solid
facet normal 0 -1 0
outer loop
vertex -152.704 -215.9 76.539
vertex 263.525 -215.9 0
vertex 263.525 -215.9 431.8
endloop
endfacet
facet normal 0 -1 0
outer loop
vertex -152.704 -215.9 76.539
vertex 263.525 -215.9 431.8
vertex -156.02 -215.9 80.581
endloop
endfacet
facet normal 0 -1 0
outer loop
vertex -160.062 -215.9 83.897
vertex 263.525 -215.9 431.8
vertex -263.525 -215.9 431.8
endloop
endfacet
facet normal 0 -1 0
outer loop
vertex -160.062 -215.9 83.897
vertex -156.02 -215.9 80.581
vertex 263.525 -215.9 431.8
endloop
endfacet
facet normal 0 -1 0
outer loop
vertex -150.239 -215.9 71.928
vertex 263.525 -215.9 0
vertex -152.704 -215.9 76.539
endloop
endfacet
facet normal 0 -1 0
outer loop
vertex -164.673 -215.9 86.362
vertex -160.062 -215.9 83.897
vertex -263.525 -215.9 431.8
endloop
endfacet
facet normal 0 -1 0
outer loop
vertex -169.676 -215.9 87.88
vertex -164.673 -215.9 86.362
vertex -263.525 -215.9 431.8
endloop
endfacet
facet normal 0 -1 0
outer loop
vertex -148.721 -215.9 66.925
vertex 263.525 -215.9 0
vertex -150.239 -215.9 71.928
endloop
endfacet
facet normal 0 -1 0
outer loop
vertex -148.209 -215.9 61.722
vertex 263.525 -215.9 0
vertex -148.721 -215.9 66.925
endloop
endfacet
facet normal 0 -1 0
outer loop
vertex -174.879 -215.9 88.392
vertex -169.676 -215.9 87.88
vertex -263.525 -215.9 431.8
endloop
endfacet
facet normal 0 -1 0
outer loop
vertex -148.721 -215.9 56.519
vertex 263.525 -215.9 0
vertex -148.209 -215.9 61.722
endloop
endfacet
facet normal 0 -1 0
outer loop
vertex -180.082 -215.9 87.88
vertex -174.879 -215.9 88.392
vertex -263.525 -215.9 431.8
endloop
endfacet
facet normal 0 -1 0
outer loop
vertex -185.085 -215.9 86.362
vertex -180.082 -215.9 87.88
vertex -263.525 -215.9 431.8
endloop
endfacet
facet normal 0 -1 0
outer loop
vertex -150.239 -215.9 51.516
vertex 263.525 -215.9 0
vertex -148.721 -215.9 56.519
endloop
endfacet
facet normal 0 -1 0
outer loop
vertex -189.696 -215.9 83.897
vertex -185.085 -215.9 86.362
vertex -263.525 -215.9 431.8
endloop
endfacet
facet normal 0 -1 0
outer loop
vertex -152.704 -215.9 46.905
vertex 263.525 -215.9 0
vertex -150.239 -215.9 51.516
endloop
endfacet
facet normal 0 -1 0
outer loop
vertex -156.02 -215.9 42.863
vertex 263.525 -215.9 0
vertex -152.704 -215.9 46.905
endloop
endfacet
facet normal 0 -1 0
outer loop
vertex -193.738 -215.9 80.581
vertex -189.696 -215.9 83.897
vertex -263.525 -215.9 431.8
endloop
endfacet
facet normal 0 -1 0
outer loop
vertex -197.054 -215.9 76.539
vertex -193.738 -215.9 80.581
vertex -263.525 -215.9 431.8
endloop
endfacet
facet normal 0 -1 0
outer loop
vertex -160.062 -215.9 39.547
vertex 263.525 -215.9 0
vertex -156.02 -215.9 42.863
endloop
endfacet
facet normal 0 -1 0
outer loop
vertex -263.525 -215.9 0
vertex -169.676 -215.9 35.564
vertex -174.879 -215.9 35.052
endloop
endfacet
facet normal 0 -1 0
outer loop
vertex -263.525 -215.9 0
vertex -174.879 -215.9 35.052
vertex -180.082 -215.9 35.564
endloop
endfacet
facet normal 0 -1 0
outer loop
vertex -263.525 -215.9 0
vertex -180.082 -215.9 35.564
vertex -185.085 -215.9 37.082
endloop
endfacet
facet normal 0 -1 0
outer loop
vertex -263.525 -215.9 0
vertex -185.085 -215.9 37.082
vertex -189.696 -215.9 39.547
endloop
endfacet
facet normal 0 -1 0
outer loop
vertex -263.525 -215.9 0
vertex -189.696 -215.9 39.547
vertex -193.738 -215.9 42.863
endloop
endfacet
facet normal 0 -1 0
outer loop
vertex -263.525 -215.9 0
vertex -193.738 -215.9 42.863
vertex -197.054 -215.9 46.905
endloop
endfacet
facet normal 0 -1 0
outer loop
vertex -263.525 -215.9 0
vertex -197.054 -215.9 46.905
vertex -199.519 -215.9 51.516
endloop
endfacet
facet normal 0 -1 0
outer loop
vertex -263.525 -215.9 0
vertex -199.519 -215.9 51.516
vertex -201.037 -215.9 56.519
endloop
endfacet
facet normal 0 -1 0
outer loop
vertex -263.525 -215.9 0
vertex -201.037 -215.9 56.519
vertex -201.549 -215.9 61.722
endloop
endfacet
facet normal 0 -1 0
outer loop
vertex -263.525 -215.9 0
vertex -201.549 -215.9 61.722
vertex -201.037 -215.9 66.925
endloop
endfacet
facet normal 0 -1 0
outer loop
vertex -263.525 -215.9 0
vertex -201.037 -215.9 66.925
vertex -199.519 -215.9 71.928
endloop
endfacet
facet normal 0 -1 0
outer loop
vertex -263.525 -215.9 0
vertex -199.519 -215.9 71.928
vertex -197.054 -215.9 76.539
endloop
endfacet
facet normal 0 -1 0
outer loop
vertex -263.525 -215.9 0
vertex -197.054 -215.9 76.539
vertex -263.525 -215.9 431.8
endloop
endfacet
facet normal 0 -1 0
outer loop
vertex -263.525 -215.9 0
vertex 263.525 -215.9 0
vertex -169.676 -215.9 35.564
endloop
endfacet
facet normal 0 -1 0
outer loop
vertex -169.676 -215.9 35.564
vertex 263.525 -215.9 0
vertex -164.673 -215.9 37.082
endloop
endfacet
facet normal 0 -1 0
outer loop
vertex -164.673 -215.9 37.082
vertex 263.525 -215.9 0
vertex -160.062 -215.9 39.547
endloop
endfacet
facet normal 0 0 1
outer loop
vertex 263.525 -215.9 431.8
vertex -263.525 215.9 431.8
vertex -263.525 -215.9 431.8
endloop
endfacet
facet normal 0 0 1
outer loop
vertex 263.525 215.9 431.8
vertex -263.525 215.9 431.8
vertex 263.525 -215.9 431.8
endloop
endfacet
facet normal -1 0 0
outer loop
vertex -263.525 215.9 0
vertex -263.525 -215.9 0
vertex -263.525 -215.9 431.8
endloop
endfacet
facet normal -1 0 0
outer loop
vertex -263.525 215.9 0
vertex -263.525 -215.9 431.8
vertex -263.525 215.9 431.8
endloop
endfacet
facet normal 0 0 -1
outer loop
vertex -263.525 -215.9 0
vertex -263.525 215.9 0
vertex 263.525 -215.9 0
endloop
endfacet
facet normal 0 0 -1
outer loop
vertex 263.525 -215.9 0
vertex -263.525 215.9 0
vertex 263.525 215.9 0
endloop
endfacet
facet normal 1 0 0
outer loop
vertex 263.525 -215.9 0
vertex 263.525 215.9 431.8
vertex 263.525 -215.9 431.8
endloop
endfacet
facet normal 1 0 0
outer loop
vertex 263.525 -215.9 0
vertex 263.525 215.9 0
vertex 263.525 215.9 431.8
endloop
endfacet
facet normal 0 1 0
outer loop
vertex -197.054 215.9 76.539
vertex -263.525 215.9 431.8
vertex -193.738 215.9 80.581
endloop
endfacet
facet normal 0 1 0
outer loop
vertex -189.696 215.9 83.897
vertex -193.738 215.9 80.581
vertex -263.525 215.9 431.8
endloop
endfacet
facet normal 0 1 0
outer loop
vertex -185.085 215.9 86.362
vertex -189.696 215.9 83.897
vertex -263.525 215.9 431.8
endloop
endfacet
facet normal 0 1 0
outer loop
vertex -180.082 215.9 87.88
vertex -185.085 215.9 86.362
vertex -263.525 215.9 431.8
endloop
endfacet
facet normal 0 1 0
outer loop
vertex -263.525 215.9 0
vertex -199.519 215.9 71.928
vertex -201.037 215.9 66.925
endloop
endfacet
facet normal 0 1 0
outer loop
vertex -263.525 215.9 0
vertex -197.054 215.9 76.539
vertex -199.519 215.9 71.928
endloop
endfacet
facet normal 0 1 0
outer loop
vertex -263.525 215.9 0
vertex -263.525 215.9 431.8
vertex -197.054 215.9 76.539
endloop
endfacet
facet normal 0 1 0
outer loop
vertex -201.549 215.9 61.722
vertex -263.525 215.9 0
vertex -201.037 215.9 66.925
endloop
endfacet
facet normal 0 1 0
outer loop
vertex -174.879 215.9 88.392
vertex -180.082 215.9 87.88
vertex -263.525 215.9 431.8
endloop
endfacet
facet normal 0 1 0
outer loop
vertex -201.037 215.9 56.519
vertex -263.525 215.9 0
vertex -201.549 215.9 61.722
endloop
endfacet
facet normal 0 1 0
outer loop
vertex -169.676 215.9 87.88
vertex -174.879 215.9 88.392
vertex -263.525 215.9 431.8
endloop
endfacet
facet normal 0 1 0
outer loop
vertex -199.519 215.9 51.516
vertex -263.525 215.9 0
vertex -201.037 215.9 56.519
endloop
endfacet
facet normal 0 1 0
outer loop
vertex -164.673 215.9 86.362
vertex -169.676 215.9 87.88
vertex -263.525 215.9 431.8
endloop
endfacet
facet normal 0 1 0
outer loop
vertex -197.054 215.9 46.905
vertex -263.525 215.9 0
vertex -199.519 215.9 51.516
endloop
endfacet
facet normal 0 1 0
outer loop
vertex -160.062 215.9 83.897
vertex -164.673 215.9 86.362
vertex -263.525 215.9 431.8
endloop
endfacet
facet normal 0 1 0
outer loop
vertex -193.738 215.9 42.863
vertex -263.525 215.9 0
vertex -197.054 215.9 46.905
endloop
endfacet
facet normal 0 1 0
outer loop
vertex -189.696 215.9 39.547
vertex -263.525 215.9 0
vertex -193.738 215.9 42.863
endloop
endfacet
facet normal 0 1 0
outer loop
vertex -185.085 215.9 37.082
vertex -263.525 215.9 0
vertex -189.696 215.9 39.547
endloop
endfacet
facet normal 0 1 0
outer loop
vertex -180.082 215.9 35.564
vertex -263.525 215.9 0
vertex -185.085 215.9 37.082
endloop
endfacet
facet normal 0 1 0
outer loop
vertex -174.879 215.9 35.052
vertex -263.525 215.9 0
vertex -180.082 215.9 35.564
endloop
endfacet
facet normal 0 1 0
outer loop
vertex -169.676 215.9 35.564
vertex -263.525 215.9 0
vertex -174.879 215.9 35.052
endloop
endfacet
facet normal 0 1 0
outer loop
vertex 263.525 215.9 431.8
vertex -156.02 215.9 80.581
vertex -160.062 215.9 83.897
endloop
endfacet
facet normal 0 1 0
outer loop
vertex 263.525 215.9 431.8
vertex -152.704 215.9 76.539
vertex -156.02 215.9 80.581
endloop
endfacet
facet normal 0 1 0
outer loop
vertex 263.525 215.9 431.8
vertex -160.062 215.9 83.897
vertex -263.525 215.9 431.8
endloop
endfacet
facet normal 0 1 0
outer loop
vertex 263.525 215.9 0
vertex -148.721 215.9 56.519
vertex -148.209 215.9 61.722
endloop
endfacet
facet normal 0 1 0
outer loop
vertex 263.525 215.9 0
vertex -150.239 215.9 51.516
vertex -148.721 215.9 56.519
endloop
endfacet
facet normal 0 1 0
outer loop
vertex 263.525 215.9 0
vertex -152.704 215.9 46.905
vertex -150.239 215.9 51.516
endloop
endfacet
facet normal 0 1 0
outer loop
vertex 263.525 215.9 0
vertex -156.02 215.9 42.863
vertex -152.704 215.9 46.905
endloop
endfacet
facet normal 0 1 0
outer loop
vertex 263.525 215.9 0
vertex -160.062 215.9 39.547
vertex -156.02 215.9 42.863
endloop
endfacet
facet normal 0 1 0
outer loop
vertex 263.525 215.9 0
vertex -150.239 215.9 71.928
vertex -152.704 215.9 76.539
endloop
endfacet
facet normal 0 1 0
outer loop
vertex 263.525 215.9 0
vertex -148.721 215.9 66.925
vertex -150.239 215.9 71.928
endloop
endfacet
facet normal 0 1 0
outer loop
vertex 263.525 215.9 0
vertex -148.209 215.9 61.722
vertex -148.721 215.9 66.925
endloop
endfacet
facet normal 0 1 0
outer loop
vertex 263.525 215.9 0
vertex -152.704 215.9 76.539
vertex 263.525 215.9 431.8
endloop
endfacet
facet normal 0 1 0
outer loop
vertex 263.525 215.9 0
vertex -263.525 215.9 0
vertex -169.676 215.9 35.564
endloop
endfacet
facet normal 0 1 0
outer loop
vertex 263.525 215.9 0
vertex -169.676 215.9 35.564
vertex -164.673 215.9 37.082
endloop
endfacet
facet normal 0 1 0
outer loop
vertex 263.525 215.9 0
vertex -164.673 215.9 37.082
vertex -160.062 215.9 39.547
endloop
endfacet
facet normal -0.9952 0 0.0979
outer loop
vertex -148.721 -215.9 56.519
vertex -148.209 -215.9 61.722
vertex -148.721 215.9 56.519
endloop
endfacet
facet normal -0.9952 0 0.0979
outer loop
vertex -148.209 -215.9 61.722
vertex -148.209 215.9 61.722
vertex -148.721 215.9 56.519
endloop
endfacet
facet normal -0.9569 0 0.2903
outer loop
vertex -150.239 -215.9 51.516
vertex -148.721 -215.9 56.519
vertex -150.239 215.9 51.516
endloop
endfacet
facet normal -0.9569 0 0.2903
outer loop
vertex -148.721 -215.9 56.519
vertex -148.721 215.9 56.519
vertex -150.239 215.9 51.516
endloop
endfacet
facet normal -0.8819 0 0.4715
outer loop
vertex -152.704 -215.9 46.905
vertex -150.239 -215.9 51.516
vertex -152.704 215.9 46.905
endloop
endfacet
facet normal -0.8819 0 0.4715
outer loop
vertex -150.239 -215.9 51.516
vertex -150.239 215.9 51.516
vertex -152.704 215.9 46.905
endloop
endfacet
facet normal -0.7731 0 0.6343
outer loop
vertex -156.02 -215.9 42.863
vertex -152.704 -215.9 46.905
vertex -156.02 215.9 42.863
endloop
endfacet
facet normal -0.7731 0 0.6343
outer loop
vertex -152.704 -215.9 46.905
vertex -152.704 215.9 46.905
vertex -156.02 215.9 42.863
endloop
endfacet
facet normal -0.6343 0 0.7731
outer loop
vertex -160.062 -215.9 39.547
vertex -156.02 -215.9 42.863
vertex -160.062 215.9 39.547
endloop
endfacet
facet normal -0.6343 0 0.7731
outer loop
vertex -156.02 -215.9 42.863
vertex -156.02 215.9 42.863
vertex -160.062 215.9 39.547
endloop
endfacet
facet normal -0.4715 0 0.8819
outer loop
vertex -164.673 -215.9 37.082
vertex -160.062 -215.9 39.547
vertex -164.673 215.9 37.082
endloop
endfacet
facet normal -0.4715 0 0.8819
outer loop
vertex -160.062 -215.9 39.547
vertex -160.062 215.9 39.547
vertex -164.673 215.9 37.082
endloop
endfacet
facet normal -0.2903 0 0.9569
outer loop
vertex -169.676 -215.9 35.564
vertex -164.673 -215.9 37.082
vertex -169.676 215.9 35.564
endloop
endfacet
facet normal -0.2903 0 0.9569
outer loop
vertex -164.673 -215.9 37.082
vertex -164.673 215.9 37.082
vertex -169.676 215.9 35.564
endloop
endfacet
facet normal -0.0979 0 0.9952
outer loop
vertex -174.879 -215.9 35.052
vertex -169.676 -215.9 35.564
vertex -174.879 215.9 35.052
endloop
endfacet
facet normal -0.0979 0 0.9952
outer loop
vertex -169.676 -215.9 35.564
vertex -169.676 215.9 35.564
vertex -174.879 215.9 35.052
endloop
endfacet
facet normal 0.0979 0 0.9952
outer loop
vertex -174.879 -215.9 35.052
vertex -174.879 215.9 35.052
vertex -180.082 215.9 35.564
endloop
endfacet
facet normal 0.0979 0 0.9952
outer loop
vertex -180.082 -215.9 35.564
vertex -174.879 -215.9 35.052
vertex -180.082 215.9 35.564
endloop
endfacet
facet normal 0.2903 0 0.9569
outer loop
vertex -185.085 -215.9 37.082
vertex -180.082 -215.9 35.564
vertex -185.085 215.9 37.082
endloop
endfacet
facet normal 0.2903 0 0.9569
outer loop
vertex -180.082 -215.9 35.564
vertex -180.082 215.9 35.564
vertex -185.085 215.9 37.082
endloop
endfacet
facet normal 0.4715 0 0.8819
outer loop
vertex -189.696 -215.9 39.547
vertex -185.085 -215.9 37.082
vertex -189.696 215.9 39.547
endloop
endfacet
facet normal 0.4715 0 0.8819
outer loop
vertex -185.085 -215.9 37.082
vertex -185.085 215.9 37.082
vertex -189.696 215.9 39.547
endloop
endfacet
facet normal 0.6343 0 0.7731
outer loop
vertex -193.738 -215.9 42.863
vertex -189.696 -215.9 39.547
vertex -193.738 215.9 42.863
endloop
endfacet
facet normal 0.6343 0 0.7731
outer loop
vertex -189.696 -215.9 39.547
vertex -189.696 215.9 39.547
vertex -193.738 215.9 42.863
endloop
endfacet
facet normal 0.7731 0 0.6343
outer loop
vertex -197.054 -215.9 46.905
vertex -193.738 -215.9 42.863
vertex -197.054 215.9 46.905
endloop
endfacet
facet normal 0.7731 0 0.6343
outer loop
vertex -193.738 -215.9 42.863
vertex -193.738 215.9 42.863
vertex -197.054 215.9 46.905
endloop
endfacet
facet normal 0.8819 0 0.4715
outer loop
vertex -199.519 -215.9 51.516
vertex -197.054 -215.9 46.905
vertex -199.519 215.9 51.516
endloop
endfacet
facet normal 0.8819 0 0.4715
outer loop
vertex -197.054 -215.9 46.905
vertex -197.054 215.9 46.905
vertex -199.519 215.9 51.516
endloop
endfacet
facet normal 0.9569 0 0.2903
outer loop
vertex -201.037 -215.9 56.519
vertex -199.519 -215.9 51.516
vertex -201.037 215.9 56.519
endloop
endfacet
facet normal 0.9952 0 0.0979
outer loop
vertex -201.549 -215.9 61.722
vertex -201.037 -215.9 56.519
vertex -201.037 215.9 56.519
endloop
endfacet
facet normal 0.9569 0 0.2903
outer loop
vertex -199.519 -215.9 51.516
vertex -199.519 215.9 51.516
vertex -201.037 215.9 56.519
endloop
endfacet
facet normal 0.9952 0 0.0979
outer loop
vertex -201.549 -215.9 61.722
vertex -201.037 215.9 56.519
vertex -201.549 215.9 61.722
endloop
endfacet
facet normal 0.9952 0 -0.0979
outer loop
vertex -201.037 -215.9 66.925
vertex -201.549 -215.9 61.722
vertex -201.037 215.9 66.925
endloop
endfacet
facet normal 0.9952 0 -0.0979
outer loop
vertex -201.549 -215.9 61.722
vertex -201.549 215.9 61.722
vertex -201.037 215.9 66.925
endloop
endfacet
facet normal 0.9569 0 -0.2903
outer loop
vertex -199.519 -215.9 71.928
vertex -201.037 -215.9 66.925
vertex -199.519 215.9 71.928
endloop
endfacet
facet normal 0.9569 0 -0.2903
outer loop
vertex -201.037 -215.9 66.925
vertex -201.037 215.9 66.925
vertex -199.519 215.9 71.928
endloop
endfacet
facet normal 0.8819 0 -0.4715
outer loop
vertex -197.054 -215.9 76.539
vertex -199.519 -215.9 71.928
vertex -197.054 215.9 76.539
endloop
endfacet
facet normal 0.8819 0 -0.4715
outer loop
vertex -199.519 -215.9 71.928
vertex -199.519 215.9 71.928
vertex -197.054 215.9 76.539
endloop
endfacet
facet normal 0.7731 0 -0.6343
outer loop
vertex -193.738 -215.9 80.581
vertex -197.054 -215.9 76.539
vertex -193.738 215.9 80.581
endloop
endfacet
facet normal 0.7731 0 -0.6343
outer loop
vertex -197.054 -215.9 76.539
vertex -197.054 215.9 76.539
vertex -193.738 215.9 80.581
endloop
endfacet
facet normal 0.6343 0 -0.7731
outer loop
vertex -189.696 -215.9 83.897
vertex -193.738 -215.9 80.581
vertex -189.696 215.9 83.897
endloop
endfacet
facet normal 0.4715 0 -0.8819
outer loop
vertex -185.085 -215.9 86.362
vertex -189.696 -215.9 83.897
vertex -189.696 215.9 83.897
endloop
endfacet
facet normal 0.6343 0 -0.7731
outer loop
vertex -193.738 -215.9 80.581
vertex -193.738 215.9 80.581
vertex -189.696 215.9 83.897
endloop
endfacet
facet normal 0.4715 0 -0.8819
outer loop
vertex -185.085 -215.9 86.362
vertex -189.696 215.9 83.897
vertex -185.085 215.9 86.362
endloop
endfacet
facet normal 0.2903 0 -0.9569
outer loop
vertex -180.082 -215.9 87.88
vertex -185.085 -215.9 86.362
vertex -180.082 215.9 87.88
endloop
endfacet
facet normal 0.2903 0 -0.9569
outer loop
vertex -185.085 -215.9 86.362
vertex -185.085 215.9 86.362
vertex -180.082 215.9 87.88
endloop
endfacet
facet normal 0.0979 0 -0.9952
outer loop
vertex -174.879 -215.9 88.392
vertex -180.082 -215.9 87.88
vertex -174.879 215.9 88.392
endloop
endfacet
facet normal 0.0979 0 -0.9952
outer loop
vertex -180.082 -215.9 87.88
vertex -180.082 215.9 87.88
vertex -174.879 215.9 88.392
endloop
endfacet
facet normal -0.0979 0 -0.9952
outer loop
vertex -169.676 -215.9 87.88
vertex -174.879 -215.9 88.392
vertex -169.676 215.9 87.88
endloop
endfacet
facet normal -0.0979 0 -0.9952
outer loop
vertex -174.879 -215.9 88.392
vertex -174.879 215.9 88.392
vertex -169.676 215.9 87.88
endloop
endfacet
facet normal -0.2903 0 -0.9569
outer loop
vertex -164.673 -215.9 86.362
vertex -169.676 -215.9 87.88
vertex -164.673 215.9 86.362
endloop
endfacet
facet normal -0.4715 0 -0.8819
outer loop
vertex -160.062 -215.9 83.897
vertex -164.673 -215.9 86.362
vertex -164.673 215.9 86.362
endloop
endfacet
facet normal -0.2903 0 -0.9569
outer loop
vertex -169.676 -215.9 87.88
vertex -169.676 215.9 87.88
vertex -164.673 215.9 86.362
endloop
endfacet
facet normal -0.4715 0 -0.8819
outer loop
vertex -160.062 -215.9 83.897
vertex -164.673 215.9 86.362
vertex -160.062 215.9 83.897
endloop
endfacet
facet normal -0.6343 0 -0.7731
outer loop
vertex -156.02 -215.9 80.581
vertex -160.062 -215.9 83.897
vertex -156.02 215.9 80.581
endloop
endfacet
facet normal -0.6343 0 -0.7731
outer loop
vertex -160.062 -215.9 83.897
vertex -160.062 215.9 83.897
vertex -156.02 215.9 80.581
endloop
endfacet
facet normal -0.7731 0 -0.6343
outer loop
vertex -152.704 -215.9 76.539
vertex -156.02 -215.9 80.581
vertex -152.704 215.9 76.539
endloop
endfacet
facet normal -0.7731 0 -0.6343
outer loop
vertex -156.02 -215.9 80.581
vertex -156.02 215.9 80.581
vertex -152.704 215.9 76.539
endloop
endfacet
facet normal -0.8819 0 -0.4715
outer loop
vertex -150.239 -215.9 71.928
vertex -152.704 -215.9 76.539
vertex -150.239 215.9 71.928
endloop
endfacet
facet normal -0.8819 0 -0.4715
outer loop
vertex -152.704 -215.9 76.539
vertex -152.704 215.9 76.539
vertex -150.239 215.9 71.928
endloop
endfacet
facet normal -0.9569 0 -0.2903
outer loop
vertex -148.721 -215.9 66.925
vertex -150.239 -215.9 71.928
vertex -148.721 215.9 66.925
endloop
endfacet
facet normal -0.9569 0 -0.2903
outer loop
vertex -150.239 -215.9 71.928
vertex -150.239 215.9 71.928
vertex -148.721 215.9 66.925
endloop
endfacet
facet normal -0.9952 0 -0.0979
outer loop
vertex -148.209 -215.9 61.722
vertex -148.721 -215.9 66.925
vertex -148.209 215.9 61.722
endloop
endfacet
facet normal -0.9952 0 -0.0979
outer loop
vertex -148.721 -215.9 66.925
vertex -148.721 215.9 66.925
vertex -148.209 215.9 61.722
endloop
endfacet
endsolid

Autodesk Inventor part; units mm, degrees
ref_plane "YZ Plane" through (0, 0, 0) normal (1, 0, 0) x (0, 1, 0)
ref_plane "XZ Plane" through (0, 0, 0) normal (0, 1, 0) x (-1, 0, 0)
ref_plane "XY Plane" through (0, 0, 0) normal (0, 0, 1) x (1, 0, 0)
sketch "Sketch1" plane through (0, 0, 0) normal (0, 0, 1) x (1, 0, 0)
  line L0 (263.525, -215.9) -> (-263.525, -215.9)
  line L1 (-263.525, -215.9) -> (-263.525, 215.9)
  line L2 (-263.525, 215.9) -> (263.525, 215.9)
  line L3 (263.525, 215.9) -> (263.525, -215.9)
  line L4 (263.525, -215.9) -> (-263.525, 215.9) construction
  line L5 (-263.525, -215.9) -> (263.525, 215.9) construction
  point P0 (0, 0)
  dimension "d0" = 527.05
  dimension "d1" = 431.8
extrude "Extrusion1" add sketch "Sketch1" along normal blind 431.8
sketch "Sketch2" plane through (-263.525, 215.9, 0) normal (0, 1, 0) x (1, 0, 0)
  circle A0 centre (88.646, -61.722) radius 26.67
  point P0 (263.525, 0)
  dimension "d4" = 53.34
extrude "Extrusion2" cut sketch "Sketch2" against normal blind 431.8
properties part number "Sump Baffle Tub"
